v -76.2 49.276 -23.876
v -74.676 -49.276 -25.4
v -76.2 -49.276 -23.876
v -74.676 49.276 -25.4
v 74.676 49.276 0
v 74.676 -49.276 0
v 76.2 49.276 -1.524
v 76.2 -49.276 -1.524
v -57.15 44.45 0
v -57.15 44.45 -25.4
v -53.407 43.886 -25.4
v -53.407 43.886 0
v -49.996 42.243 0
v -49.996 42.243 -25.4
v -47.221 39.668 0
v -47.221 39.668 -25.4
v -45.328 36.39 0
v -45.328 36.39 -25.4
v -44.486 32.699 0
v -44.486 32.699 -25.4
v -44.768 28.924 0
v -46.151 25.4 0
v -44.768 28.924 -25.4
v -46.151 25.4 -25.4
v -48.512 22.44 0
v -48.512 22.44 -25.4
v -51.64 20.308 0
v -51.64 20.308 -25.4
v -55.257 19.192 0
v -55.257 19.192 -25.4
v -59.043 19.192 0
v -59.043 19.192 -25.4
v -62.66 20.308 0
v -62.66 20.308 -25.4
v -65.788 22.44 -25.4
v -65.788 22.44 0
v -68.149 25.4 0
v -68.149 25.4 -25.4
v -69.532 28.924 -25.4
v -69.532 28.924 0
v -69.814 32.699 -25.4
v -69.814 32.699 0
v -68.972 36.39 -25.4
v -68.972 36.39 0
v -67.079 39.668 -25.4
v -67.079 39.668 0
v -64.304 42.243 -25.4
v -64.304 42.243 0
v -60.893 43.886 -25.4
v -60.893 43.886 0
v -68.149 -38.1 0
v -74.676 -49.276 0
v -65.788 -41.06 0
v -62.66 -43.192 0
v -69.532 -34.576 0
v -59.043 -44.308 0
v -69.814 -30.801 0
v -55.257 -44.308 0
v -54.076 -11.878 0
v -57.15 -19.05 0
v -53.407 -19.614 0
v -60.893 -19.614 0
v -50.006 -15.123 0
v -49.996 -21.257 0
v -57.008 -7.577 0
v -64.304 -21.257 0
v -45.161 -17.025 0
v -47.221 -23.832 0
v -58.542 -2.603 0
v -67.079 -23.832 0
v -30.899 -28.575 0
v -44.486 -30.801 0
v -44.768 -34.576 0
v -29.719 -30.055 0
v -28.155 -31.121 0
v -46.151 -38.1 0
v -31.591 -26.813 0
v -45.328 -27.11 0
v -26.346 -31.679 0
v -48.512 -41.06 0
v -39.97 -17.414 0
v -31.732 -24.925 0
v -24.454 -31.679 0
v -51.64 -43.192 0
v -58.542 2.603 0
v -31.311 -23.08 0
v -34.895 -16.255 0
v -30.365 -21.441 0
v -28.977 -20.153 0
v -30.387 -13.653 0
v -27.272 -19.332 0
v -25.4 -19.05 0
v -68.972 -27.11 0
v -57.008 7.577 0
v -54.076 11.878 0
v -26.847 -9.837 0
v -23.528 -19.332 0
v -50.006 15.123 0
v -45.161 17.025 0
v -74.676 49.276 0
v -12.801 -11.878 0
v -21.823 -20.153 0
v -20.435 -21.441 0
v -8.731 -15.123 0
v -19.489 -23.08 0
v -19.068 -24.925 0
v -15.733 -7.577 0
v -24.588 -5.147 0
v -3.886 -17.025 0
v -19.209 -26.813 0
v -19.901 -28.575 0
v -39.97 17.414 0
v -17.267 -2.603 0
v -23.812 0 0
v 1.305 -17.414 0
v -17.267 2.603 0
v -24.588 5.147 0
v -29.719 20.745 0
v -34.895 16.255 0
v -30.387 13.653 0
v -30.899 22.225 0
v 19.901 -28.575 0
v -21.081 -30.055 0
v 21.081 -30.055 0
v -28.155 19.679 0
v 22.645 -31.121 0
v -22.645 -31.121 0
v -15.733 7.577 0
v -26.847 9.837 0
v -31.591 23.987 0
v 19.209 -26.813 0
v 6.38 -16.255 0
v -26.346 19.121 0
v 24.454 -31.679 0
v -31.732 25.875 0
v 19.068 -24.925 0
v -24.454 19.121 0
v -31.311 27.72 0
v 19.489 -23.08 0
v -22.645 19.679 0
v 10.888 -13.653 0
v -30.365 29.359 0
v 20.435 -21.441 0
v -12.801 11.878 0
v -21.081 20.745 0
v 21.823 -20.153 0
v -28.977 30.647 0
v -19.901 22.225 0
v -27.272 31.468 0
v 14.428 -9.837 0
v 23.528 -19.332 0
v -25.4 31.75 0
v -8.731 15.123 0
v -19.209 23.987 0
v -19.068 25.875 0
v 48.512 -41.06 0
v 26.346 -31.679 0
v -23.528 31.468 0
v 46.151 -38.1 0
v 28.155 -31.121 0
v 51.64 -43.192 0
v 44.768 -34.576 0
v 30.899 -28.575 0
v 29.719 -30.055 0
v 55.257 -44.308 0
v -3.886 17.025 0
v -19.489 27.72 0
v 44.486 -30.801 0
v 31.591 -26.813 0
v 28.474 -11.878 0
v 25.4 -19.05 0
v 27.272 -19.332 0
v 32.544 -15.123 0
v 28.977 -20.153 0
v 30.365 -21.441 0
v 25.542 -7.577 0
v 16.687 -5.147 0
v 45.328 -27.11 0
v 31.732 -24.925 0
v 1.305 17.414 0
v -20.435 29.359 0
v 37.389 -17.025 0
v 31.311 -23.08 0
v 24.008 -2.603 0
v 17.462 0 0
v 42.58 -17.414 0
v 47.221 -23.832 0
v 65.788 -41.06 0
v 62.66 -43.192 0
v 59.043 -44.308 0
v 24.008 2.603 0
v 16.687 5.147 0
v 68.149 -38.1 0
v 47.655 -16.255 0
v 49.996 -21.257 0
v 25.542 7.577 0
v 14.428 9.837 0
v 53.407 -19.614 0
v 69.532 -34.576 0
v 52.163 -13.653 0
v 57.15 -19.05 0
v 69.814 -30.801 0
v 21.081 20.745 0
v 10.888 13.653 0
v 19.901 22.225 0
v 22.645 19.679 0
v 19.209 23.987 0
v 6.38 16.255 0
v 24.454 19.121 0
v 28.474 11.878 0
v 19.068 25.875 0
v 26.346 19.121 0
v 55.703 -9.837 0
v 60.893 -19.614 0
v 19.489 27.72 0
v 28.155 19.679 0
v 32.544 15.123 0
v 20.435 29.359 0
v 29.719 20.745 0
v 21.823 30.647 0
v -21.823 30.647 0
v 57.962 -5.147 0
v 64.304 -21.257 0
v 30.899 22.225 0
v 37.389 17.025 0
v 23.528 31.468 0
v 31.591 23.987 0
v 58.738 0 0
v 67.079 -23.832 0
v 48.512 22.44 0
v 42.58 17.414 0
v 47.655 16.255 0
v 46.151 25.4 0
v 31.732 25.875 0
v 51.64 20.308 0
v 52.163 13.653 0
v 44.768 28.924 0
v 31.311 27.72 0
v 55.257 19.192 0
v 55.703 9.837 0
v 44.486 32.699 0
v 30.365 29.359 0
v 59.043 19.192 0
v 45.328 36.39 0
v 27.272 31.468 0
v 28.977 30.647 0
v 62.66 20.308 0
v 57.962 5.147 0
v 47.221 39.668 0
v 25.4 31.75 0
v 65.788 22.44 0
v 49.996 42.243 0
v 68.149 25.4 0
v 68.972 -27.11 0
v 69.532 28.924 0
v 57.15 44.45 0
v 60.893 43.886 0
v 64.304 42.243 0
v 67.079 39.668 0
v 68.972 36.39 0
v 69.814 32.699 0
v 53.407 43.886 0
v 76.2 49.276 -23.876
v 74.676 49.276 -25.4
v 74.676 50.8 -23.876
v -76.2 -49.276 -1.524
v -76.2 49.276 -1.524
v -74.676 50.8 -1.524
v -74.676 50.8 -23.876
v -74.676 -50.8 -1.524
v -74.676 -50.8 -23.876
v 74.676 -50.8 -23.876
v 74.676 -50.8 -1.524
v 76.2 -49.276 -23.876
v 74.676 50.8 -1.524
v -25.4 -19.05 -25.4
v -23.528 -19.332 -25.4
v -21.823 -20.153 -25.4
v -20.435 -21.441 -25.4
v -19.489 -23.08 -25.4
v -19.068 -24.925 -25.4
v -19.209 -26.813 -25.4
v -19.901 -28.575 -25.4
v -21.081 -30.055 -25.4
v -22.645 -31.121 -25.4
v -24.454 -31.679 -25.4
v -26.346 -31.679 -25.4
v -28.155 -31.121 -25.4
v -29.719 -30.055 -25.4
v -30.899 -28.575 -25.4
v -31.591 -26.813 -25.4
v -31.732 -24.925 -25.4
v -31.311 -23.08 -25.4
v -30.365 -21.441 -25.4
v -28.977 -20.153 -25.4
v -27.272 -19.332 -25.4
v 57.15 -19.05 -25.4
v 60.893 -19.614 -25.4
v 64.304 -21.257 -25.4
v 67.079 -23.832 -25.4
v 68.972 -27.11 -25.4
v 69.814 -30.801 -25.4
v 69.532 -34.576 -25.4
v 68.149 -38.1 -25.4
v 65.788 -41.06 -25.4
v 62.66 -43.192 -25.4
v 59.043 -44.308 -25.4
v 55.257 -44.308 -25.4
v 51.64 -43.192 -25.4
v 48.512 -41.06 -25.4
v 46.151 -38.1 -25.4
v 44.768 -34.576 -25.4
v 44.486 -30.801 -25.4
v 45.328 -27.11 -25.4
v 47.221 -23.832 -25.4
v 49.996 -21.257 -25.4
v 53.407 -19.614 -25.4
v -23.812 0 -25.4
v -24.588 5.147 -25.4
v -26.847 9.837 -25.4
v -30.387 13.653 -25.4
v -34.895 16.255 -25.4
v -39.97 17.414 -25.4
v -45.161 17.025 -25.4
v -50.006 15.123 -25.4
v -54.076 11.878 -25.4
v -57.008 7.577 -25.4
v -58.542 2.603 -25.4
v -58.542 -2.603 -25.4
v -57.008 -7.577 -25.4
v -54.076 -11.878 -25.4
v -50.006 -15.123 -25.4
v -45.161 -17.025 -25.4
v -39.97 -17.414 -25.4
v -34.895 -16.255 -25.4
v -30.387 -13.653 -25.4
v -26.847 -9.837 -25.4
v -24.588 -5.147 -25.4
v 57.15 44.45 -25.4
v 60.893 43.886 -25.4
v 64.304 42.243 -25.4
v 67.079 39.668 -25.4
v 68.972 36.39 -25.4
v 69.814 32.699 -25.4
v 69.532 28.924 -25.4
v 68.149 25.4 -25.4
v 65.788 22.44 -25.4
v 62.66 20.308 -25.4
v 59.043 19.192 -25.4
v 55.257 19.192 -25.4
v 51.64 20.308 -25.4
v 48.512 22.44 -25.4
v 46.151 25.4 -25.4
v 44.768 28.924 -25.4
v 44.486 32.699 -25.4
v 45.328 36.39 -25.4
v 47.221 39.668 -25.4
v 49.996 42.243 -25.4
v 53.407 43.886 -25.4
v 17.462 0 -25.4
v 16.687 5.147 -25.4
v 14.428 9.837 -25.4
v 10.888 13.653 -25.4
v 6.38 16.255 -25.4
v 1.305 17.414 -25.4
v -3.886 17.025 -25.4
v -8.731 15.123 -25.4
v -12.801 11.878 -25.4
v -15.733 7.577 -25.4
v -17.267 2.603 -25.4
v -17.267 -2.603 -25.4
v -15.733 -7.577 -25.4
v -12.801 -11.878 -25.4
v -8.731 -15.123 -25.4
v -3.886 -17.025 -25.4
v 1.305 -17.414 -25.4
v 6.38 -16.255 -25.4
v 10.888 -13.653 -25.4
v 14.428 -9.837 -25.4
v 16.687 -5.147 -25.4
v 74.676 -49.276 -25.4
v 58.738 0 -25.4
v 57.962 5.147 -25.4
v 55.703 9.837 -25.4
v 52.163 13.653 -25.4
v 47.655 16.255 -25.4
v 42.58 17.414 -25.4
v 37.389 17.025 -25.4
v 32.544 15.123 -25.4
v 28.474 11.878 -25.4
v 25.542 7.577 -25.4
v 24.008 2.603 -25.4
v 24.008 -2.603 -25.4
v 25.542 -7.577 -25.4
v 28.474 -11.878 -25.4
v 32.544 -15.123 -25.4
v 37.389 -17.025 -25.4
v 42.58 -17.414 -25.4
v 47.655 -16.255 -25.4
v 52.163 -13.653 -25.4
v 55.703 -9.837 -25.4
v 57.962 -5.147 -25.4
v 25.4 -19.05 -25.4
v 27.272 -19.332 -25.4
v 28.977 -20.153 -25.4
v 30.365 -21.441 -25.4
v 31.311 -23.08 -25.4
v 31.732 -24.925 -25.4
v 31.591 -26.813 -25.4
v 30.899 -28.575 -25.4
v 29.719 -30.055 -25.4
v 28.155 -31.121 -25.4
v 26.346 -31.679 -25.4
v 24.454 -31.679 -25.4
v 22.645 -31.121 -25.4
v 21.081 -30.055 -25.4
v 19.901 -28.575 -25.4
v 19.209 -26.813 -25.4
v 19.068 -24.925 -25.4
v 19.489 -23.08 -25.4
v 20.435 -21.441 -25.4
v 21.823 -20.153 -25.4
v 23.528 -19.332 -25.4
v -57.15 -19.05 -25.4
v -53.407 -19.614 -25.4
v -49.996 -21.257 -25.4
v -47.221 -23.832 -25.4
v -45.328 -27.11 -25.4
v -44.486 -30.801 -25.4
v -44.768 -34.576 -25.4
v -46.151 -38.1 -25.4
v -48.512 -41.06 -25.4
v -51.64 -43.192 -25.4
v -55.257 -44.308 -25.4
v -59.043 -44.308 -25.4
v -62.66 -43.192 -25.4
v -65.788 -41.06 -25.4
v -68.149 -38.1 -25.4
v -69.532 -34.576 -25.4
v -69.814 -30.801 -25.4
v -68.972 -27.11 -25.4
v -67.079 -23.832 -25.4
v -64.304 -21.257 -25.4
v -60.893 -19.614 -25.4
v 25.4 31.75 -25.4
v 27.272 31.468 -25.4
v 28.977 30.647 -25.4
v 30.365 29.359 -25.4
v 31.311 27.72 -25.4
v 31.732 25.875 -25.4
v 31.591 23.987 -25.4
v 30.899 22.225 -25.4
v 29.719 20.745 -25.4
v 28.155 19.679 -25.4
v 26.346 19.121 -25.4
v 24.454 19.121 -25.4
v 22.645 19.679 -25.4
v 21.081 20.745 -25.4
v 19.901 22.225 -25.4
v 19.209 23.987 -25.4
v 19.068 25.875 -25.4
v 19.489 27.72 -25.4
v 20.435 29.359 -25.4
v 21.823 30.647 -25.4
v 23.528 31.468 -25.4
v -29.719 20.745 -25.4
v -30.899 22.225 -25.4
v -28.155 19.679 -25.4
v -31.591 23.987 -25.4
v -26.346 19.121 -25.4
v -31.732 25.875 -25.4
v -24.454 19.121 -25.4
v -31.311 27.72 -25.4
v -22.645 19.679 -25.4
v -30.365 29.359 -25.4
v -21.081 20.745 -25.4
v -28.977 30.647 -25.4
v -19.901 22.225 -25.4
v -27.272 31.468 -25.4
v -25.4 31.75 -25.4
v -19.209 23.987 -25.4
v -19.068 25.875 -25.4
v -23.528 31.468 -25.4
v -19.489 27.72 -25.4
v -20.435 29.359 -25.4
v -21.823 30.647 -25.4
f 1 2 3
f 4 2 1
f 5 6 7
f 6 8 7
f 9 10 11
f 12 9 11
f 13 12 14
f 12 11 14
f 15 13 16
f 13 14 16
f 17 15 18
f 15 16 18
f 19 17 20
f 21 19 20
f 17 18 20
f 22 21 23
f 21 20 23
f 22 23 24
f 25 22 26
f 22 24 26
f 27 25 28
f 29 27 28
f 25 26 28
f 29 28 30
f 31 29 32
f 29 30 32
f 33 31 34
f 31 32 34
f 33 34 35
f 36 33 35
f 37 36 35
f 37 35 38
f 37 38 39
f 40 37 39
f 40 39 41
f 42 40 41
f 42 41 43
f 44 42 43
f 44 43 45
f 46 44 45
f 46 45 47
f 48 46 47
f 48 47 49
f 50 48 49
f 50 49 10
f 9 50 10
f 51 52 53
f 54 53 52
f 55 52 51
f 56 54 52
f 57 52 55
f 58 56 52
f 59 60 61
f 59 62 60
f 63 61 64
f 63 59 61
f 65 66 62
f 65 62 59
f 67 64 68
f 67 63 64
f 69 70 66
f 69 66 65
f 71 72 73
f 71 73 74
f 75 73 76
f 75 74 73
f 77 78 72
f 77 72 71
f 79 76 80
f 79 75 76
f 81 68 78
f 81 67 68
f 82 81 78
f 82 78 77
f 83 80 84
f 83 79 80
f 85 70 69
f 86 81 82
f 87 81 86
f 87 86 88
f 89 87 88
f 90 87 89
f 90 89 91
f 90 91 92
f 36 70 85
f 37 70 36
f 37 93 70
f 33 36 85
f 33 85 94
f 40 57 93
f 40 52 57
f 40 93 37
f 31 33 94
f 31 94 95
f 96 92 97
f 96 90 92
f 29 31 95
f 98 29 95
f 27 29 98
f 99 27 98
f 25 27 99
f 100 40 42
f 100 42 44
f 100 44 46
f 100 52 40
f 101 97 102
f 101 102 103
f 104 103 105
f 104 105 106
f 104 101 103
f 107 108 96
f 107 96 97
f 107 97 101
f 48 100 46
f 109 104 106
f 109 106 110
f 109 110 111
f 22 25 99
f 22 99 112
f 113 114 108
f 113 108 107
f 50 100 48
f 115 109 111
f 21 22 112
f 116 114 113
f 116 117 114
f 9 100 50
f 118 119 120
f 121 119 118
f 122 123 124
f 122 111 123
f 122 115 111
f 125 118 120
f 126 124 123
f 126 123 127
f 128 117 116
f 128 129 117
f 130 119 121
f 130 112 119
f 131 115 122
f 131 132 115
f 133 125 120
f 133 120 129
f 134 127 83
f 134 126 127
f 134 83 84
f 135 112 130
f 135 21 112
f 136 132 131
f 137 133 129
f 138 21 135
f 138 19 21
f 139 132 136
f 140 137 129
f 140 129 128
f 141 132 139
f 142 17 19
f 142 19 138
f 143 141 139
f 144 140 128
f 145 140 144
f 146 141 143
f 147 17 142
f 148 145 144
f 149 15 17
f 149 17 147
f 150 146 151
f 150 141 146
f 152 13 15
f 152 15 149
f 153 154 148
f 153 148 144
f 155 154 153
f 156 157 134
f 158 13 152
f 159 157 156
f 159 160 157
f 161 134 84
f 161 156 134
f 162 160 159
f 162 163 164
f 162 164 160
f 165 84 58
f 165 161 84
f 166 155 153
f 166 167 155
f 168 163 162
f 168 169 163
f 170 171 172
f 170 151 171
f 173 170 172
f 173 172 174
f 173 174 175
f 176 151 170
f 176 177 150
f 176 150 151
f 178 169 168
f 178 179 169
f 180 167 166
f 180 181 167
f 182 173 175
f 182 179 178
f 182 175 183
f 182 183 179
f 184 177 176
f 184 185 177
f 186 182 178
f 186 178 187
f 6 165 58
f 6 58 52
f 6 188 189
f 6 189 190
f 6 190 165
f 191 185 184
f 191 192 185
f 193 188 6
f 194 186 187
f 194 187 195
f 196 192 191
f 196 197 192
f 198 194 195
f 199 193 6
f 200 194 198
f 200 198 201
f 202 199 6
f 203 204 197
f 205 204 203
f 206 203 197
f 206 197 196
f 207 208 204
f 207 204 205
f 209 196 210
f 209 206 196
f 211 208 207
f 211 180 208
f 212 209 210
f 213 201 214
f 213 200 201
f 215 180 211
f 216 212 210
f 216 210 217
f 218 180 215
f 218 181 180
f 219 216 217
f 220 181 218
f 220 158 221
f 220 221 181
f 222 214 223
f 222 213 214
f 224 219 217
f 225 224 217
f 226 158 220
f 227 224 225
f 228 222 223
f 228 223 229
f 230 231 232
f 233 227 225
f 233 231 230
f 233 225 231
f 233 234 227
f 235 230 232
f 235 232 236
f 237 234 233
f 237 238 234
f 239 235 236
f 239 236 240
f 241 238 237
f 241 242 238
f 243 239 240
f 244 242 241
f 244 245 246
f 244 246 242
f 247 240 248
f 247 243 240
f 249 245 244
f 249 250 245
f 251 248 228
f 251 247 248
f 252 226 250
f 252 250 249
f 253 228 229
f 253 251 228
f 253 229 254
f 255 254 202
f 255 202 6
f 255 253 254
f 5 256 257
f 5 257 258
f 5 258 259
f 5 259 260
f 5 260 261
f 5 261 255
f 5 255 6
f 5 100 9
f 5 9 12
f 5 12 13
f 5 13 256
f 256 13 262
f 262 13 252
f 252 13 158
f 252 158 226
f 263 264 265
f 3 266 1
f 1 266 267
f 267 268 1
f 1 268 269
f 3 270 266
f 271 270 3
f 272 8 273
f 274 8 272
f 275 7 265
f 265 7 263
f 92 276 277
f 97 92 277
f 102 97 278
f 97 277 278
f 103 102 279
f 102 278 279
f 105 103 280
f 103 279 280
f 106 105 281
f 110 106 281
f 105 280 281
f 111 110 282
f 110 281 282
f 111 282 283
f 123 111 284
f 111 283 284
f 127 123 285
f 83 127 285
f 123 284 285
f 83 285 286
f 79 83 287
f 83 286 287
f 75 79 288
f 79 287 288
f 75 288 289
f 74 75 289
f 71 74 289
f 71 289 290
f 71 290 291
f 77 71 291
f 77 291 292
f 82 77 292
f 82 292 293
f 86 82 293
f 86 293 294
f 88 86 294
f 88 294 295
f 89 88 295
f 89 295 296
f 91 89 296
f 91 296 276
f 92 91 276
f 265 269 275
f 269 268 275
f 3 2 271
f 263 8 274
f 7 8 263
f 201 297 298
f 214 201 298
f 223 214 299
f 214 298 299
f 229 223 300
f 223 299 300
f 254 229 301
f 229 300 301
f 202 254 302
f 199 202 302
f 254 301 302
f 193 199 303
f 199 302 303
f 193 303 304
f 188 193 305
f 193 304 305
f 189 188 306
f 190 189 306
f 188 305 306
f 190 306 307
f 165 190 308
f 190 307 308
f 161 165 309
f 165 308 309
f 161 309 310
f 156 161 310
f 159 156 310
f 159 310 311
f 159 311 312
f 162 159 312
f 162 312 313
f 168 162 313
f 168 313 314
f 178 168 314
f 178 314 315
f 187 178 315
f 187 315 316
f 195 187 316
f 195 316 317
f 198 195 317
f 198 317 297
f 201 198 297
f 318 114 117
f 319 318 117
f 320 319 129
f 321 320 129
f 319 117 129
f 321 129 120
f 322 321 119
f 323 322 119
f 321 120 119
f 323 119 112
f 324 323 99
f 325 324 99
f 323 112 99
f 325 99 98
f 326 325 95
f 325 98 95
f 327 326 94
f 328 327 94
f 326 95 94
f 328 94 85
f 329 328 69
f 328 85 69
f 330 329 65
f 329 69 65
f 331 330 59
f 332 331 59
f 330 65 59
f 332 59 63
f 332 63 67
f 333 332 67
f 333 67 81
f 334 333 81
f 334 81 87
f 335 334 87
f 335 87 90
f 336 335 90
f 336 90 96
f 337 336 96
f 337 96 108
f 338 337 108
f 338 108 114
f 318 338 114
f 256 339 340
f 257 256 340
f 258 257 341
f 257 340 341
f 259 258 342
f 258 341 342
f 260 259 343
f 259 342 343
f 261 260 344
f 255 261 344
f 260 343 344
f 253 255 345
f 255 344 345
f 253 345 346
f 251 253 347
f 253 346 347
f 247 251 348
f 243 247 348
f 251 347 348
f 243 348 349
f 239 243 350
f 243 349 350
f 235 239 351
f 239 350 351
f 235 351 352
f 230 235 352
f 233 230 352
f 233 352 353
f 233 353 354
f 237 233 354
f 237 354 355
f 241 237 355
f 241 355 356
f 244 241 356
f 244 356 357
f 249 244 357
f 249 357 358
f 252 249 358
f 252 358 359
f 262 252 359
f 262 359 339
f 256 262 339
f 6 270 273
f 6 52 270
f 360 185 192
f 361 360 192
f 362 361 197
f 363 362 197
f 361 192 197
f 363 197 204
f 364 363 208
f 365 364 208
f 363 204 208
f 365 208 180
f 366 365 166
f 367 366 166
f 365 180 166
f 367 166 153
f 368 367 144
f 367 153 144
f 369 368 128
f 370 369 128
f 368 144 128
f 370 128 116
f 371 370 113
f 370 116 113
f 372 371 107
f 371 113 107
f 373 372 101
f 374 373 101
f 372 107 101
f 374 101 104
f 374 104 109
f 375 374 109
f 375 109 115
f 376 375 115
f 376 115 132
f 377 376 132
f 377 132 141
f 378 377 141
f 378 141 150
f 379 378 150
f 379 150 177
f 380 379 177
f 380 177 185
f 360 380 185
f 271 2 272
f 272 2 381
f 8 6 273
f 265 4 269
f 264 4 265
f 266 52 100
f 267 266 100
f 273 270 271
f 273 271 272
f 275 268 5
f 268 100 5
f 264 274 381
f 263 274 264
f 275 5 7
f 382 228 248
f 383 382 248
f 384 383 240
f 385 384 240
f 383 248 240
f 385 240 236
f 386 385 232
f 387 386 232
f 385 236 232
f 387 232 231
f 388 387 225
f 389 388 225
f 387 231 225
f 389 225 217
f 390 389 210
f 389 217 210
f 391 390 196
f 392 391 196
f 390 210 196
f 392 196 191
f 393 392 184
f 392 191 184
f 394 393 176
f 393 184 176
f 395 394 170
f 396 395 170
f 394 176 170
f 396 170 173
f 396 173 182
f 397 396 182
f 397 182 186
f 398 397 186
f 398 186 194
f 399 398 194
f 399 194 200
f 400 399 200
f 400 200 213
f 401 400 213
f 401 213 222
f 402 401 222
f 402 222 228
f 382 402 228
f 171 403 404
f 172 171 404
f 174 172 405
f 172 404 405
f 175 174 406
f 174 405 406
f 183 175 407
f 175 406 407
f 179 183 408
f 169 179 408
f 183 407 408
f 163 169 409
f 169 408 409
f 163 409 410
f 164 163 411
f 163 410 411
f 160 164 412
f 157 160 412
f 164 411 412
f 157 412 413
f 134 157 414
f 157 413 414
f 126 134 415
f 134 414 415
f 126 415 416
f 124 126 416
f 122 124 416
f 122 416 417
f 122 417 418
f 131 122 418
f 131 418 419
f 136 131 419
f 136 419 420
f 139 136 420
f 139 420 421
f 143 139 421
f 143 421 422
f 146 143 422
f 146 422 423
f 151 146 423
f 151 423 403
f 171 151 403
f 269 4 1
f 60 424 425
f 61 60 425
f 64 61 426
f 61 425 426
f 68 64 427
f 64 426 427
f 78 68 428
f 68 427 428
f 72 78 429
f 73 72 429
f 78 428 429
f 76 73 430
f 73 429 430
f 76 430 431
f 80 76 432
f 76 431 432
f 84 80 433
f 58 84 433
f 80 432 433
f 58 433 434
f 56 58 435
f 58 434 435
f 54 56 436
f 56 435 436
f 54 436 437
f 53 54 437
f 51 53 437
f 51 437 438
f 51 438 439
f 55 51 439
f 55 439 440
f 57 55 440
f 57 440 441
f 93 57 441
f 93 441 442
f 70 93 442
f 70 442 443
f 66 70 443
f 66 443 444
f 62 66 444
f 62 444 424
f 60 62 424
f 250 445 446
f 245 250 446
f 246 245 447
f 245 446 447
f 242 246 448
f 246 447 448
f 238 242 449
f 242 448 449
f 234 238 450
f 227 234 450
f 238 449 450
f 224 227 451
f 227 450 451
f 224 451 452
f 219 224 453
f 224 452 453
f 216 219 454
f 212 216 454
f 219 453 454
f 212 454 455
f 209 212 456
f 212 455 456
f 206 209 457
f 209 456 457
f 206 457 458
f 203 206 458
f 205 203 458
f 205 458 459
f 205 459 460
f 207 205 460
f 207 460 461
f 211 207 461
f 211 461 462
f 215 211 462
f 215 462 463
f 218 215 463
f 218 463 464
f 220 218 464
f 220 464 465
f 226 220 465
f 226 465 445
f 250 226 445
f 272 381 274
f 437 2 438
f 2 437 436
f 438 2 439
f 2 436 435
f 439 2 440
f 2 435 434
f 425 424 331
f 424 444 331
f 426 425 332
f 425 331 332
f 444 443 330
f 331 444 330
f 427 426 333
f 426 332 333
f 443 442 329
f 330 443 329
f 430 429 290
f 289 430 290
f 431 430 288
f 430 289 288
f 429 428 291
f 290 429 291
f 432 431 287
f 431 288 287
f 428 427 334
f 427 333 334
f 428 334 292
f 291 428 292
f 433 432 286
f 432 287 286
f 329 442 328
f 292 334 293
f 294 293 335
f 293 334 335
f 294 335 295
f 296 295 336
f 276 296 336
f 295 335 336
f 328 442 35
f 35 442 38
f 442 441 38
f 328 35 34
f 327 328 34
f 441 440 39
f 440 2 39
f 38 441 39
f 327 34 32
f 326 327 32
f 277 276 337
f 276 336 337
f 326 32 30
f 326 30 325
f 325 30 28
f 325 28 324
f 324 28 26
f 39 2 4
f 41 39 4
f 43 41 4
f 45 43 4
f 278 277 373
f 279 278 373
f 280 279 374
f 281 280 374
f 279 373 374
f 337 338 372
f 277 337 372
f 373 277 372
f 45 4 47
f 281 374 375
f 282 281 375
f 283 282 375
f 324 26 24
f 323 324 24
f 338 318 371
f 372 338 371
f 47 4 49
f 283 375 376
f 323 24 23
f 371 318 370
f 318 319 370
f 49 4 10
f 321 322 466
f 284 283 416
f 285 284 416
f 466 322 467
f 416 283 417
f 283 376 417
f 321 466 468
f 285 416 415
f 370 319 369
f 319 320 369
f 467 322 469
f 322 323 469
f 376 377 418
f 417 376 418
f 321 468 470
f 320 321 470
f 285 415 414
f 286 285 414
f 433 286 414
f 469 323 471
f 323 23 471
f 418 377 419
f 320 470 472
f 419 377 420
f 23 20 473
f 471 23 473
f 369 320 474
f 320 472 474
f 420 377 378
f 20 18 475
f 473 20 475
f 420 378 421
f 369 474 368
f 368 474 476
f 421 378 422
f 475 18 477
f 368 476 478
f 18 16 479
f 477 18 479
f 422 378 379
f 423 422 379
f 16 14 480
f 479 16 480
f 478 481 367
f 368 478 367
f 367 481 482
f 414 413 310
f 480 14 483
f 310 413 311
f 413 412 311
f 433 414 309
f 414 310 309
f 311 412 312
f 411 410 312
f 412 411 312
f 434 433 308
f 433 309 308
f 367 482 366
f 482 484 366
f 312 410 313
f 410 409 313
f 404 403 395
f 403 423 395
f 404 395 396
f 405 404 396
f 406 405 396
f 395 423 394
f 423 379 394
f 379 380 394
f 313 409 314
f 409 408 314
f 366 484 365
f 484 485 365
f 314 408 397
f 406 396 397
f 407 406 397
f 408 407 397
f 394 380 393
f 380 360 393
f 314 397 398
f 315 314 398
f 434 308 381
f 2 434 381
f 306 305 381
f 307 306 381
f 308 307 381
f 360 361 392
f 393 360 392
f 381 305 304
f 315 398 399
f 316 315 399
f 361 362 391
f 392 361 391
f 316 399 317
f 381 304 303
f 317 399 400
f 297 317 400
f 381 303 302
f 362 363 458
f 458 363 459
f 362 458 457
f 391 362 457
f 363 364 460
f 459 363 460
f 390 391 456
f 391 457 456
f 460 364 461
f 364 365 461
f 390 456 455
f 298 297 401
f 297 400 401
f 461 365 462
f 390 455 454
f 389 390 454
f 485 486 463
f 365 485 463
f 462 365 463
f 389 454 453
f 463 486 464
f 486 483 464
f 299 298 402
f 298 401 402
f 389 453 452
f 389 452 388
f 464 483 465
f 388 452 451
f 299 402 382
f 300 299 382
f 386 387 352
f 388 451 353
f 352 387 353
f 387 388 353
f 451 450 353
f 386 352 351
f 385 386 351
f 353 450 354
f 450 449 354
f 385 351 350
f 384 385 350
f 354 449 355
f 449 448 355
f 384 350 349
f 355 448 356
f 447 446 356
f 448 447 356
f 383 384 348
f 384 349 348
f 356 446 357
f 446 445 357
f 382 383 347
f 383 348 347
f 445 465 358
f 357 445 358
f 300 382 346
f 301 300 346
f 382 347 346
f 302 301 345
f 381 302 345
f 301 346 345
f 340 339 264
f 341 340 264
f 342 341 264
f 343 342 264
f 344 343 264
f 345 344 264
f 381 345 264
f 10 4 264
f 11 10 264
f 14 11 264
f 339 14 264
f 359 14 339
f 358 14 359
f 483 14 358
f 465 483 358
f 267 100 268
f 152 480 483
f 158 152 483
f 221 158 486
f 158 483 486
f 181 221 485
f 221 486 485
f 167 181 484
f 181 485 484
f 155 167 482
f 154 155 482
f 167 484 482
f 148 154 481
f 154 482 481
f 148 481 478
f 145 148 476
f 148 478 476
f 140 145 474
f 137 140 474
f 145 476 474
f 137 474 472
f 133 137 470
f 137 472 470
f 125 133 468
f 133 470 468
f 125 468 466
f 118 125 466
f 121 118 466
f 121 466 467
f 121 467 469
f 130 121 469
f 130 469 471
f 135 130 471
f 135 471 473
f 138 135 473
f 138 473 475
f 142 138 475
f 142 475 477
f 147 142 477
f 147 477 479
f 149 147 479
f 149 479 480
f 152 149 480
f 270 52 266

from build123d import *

# Parameters (mm, degrees)
SKETCH1_W            = 152.4
SKETCH1_H            = 101.6
EXTRUDE1_DEPTH       = 25.4
SKETCH2_R            = 6.35
CUT_EXTRUDE2_DEPTH   = 96.038097624
LPATTERN1_COUNT      = 2
LPATTERN1_PITCH      = 50.8
LPATTERN1_COUNT_DIR2 = 2
LPATTERN1_PITCH_DIR2 = 50.8
SKETCH3_R            = 12.7
CUT_EXTRUDE3_DEPTH   = 96.038097624
LPATTERN2_COUNT      = 2
LPATTERN2_PITCH      = 63.5
LPATTERN2_COUNT_DIR2 = 2
LPATTERN2_PITCH_DIR2 = 114.3
CHAMFER1_SIZE        = 1.524
SKETCH4_R            = 17.4625
CUT_EXTRUDE5_DEPTH   = 96.038097624
LPATTERN3_COUNT      = 3
LPATTERN3_PITCH      = 41.275


with BuildPart() as part:
    # Sketch1 → Extrude1 (new body)
    with BuildSketch(Plane.XY):
        Rectangle(SKETCH1_W, SKETCH1_H)
    extrude(amount=-EXTRUDE1_DEPTH)

    # Sketch2 → Cut-Extrude2 (cut, through all)
    with BuildSketch(Plane(origin=(0, 0, -25.4), x_dir=(1, 0, 0), z_dir=(0, 0, -1))):
        with Locations(Location((-25.4, -25.4, 0), (0, 0, 270))):
            Circle(SKETCH2_R)
    cut_extrude2 = extrude(amount=-CUT_EXTRUDE2_DEPTH, mode=Mode.SUBTRACT)

    # LPattern1: Cut-Extrude2 2 × 2
    with Locations(*[(i * LPATTERN1_PITCH, -j * LPATTERN1_PITCH_DIR2, 0) for i in range(LPATTERN1_COUNT) for j in range(LPATTERN1_COUNT_DIR2) if (i, j) != (0, 0)]):
        add(cut_extrude2, mode=Mode.SUBTRACT)

    # Sketch3 → Cut-Extrude3 (cut, through all)
    with BuildSketch(Plane(origin=(0, 0, -25.4), x_dir=(1, 0, 0), z_dir=(0, 0, -1))):
        with Locations(Location((57.15, 31.75, 0), (0, 0, 270))):
            Circle(SKETCH3_R)
    cut_extrude3 = extrude(amount=-CUT_EXTRUDE3_DEPTH, mode=Mode.SUBTRACT)

    # LPattern2: Cut-Extrude3 2 × 2
    with Locations(*[(-j * LPATTERN2_PITCH_DIR2, i * LPATTERN2_PITCH, 0) for i in range(LPATTERN2_COUNT) for j in range(LPATTERN2_COUNT_DIR2) if (i, j) != (0, 0)]):
        add(cut_extrude3, mode=Mode.SUBTRACT)

    # Chamfer1
    chamfer1_edges = [part.edges().sort_by_distance(p)[0] for p in [
        (76.2, 0, -25.4),
        (0, 50.8, -25.4),
        (-76.2, 0, -25.4),
        (0, 50.8, 0),
        (76.2, 0, 0),
        (0, -50.8, 0),
        (-76.2, 0, 0),
        (0, -50.8, -25.4),
        (-76.2, 50.8, -12.7),
        (76.2, 50.8, -12.7),
        (76.2, -50.8, -12.7),
        (-76.2, -50.8, -12.7),
    ]]
    chamfer(chamfer1_edges, length=CHAMFER1_SIZE)

    # Sketch4 → Cut-Extrude5 (cut, through all)
    with BuildSketch(Plane.XY):
        with Locations((41.275, 0)):
            Circle(SKETCH4_R)
    cut_extrude5 = extrude(amount=-CUT_EXTRUDE5_DEPTH, mode=Mode.SUBTRACT)

    # LPattern3: Cut-Extrude5 ×3
    with Locations(*[(-i * LPATTERN3_PITCH, 0, 0) for i in range(1, LPATTERN3_COUNT)]):
        add(cut_extrude5, mode=Mode.SUBTRACT)


solid = part.part
